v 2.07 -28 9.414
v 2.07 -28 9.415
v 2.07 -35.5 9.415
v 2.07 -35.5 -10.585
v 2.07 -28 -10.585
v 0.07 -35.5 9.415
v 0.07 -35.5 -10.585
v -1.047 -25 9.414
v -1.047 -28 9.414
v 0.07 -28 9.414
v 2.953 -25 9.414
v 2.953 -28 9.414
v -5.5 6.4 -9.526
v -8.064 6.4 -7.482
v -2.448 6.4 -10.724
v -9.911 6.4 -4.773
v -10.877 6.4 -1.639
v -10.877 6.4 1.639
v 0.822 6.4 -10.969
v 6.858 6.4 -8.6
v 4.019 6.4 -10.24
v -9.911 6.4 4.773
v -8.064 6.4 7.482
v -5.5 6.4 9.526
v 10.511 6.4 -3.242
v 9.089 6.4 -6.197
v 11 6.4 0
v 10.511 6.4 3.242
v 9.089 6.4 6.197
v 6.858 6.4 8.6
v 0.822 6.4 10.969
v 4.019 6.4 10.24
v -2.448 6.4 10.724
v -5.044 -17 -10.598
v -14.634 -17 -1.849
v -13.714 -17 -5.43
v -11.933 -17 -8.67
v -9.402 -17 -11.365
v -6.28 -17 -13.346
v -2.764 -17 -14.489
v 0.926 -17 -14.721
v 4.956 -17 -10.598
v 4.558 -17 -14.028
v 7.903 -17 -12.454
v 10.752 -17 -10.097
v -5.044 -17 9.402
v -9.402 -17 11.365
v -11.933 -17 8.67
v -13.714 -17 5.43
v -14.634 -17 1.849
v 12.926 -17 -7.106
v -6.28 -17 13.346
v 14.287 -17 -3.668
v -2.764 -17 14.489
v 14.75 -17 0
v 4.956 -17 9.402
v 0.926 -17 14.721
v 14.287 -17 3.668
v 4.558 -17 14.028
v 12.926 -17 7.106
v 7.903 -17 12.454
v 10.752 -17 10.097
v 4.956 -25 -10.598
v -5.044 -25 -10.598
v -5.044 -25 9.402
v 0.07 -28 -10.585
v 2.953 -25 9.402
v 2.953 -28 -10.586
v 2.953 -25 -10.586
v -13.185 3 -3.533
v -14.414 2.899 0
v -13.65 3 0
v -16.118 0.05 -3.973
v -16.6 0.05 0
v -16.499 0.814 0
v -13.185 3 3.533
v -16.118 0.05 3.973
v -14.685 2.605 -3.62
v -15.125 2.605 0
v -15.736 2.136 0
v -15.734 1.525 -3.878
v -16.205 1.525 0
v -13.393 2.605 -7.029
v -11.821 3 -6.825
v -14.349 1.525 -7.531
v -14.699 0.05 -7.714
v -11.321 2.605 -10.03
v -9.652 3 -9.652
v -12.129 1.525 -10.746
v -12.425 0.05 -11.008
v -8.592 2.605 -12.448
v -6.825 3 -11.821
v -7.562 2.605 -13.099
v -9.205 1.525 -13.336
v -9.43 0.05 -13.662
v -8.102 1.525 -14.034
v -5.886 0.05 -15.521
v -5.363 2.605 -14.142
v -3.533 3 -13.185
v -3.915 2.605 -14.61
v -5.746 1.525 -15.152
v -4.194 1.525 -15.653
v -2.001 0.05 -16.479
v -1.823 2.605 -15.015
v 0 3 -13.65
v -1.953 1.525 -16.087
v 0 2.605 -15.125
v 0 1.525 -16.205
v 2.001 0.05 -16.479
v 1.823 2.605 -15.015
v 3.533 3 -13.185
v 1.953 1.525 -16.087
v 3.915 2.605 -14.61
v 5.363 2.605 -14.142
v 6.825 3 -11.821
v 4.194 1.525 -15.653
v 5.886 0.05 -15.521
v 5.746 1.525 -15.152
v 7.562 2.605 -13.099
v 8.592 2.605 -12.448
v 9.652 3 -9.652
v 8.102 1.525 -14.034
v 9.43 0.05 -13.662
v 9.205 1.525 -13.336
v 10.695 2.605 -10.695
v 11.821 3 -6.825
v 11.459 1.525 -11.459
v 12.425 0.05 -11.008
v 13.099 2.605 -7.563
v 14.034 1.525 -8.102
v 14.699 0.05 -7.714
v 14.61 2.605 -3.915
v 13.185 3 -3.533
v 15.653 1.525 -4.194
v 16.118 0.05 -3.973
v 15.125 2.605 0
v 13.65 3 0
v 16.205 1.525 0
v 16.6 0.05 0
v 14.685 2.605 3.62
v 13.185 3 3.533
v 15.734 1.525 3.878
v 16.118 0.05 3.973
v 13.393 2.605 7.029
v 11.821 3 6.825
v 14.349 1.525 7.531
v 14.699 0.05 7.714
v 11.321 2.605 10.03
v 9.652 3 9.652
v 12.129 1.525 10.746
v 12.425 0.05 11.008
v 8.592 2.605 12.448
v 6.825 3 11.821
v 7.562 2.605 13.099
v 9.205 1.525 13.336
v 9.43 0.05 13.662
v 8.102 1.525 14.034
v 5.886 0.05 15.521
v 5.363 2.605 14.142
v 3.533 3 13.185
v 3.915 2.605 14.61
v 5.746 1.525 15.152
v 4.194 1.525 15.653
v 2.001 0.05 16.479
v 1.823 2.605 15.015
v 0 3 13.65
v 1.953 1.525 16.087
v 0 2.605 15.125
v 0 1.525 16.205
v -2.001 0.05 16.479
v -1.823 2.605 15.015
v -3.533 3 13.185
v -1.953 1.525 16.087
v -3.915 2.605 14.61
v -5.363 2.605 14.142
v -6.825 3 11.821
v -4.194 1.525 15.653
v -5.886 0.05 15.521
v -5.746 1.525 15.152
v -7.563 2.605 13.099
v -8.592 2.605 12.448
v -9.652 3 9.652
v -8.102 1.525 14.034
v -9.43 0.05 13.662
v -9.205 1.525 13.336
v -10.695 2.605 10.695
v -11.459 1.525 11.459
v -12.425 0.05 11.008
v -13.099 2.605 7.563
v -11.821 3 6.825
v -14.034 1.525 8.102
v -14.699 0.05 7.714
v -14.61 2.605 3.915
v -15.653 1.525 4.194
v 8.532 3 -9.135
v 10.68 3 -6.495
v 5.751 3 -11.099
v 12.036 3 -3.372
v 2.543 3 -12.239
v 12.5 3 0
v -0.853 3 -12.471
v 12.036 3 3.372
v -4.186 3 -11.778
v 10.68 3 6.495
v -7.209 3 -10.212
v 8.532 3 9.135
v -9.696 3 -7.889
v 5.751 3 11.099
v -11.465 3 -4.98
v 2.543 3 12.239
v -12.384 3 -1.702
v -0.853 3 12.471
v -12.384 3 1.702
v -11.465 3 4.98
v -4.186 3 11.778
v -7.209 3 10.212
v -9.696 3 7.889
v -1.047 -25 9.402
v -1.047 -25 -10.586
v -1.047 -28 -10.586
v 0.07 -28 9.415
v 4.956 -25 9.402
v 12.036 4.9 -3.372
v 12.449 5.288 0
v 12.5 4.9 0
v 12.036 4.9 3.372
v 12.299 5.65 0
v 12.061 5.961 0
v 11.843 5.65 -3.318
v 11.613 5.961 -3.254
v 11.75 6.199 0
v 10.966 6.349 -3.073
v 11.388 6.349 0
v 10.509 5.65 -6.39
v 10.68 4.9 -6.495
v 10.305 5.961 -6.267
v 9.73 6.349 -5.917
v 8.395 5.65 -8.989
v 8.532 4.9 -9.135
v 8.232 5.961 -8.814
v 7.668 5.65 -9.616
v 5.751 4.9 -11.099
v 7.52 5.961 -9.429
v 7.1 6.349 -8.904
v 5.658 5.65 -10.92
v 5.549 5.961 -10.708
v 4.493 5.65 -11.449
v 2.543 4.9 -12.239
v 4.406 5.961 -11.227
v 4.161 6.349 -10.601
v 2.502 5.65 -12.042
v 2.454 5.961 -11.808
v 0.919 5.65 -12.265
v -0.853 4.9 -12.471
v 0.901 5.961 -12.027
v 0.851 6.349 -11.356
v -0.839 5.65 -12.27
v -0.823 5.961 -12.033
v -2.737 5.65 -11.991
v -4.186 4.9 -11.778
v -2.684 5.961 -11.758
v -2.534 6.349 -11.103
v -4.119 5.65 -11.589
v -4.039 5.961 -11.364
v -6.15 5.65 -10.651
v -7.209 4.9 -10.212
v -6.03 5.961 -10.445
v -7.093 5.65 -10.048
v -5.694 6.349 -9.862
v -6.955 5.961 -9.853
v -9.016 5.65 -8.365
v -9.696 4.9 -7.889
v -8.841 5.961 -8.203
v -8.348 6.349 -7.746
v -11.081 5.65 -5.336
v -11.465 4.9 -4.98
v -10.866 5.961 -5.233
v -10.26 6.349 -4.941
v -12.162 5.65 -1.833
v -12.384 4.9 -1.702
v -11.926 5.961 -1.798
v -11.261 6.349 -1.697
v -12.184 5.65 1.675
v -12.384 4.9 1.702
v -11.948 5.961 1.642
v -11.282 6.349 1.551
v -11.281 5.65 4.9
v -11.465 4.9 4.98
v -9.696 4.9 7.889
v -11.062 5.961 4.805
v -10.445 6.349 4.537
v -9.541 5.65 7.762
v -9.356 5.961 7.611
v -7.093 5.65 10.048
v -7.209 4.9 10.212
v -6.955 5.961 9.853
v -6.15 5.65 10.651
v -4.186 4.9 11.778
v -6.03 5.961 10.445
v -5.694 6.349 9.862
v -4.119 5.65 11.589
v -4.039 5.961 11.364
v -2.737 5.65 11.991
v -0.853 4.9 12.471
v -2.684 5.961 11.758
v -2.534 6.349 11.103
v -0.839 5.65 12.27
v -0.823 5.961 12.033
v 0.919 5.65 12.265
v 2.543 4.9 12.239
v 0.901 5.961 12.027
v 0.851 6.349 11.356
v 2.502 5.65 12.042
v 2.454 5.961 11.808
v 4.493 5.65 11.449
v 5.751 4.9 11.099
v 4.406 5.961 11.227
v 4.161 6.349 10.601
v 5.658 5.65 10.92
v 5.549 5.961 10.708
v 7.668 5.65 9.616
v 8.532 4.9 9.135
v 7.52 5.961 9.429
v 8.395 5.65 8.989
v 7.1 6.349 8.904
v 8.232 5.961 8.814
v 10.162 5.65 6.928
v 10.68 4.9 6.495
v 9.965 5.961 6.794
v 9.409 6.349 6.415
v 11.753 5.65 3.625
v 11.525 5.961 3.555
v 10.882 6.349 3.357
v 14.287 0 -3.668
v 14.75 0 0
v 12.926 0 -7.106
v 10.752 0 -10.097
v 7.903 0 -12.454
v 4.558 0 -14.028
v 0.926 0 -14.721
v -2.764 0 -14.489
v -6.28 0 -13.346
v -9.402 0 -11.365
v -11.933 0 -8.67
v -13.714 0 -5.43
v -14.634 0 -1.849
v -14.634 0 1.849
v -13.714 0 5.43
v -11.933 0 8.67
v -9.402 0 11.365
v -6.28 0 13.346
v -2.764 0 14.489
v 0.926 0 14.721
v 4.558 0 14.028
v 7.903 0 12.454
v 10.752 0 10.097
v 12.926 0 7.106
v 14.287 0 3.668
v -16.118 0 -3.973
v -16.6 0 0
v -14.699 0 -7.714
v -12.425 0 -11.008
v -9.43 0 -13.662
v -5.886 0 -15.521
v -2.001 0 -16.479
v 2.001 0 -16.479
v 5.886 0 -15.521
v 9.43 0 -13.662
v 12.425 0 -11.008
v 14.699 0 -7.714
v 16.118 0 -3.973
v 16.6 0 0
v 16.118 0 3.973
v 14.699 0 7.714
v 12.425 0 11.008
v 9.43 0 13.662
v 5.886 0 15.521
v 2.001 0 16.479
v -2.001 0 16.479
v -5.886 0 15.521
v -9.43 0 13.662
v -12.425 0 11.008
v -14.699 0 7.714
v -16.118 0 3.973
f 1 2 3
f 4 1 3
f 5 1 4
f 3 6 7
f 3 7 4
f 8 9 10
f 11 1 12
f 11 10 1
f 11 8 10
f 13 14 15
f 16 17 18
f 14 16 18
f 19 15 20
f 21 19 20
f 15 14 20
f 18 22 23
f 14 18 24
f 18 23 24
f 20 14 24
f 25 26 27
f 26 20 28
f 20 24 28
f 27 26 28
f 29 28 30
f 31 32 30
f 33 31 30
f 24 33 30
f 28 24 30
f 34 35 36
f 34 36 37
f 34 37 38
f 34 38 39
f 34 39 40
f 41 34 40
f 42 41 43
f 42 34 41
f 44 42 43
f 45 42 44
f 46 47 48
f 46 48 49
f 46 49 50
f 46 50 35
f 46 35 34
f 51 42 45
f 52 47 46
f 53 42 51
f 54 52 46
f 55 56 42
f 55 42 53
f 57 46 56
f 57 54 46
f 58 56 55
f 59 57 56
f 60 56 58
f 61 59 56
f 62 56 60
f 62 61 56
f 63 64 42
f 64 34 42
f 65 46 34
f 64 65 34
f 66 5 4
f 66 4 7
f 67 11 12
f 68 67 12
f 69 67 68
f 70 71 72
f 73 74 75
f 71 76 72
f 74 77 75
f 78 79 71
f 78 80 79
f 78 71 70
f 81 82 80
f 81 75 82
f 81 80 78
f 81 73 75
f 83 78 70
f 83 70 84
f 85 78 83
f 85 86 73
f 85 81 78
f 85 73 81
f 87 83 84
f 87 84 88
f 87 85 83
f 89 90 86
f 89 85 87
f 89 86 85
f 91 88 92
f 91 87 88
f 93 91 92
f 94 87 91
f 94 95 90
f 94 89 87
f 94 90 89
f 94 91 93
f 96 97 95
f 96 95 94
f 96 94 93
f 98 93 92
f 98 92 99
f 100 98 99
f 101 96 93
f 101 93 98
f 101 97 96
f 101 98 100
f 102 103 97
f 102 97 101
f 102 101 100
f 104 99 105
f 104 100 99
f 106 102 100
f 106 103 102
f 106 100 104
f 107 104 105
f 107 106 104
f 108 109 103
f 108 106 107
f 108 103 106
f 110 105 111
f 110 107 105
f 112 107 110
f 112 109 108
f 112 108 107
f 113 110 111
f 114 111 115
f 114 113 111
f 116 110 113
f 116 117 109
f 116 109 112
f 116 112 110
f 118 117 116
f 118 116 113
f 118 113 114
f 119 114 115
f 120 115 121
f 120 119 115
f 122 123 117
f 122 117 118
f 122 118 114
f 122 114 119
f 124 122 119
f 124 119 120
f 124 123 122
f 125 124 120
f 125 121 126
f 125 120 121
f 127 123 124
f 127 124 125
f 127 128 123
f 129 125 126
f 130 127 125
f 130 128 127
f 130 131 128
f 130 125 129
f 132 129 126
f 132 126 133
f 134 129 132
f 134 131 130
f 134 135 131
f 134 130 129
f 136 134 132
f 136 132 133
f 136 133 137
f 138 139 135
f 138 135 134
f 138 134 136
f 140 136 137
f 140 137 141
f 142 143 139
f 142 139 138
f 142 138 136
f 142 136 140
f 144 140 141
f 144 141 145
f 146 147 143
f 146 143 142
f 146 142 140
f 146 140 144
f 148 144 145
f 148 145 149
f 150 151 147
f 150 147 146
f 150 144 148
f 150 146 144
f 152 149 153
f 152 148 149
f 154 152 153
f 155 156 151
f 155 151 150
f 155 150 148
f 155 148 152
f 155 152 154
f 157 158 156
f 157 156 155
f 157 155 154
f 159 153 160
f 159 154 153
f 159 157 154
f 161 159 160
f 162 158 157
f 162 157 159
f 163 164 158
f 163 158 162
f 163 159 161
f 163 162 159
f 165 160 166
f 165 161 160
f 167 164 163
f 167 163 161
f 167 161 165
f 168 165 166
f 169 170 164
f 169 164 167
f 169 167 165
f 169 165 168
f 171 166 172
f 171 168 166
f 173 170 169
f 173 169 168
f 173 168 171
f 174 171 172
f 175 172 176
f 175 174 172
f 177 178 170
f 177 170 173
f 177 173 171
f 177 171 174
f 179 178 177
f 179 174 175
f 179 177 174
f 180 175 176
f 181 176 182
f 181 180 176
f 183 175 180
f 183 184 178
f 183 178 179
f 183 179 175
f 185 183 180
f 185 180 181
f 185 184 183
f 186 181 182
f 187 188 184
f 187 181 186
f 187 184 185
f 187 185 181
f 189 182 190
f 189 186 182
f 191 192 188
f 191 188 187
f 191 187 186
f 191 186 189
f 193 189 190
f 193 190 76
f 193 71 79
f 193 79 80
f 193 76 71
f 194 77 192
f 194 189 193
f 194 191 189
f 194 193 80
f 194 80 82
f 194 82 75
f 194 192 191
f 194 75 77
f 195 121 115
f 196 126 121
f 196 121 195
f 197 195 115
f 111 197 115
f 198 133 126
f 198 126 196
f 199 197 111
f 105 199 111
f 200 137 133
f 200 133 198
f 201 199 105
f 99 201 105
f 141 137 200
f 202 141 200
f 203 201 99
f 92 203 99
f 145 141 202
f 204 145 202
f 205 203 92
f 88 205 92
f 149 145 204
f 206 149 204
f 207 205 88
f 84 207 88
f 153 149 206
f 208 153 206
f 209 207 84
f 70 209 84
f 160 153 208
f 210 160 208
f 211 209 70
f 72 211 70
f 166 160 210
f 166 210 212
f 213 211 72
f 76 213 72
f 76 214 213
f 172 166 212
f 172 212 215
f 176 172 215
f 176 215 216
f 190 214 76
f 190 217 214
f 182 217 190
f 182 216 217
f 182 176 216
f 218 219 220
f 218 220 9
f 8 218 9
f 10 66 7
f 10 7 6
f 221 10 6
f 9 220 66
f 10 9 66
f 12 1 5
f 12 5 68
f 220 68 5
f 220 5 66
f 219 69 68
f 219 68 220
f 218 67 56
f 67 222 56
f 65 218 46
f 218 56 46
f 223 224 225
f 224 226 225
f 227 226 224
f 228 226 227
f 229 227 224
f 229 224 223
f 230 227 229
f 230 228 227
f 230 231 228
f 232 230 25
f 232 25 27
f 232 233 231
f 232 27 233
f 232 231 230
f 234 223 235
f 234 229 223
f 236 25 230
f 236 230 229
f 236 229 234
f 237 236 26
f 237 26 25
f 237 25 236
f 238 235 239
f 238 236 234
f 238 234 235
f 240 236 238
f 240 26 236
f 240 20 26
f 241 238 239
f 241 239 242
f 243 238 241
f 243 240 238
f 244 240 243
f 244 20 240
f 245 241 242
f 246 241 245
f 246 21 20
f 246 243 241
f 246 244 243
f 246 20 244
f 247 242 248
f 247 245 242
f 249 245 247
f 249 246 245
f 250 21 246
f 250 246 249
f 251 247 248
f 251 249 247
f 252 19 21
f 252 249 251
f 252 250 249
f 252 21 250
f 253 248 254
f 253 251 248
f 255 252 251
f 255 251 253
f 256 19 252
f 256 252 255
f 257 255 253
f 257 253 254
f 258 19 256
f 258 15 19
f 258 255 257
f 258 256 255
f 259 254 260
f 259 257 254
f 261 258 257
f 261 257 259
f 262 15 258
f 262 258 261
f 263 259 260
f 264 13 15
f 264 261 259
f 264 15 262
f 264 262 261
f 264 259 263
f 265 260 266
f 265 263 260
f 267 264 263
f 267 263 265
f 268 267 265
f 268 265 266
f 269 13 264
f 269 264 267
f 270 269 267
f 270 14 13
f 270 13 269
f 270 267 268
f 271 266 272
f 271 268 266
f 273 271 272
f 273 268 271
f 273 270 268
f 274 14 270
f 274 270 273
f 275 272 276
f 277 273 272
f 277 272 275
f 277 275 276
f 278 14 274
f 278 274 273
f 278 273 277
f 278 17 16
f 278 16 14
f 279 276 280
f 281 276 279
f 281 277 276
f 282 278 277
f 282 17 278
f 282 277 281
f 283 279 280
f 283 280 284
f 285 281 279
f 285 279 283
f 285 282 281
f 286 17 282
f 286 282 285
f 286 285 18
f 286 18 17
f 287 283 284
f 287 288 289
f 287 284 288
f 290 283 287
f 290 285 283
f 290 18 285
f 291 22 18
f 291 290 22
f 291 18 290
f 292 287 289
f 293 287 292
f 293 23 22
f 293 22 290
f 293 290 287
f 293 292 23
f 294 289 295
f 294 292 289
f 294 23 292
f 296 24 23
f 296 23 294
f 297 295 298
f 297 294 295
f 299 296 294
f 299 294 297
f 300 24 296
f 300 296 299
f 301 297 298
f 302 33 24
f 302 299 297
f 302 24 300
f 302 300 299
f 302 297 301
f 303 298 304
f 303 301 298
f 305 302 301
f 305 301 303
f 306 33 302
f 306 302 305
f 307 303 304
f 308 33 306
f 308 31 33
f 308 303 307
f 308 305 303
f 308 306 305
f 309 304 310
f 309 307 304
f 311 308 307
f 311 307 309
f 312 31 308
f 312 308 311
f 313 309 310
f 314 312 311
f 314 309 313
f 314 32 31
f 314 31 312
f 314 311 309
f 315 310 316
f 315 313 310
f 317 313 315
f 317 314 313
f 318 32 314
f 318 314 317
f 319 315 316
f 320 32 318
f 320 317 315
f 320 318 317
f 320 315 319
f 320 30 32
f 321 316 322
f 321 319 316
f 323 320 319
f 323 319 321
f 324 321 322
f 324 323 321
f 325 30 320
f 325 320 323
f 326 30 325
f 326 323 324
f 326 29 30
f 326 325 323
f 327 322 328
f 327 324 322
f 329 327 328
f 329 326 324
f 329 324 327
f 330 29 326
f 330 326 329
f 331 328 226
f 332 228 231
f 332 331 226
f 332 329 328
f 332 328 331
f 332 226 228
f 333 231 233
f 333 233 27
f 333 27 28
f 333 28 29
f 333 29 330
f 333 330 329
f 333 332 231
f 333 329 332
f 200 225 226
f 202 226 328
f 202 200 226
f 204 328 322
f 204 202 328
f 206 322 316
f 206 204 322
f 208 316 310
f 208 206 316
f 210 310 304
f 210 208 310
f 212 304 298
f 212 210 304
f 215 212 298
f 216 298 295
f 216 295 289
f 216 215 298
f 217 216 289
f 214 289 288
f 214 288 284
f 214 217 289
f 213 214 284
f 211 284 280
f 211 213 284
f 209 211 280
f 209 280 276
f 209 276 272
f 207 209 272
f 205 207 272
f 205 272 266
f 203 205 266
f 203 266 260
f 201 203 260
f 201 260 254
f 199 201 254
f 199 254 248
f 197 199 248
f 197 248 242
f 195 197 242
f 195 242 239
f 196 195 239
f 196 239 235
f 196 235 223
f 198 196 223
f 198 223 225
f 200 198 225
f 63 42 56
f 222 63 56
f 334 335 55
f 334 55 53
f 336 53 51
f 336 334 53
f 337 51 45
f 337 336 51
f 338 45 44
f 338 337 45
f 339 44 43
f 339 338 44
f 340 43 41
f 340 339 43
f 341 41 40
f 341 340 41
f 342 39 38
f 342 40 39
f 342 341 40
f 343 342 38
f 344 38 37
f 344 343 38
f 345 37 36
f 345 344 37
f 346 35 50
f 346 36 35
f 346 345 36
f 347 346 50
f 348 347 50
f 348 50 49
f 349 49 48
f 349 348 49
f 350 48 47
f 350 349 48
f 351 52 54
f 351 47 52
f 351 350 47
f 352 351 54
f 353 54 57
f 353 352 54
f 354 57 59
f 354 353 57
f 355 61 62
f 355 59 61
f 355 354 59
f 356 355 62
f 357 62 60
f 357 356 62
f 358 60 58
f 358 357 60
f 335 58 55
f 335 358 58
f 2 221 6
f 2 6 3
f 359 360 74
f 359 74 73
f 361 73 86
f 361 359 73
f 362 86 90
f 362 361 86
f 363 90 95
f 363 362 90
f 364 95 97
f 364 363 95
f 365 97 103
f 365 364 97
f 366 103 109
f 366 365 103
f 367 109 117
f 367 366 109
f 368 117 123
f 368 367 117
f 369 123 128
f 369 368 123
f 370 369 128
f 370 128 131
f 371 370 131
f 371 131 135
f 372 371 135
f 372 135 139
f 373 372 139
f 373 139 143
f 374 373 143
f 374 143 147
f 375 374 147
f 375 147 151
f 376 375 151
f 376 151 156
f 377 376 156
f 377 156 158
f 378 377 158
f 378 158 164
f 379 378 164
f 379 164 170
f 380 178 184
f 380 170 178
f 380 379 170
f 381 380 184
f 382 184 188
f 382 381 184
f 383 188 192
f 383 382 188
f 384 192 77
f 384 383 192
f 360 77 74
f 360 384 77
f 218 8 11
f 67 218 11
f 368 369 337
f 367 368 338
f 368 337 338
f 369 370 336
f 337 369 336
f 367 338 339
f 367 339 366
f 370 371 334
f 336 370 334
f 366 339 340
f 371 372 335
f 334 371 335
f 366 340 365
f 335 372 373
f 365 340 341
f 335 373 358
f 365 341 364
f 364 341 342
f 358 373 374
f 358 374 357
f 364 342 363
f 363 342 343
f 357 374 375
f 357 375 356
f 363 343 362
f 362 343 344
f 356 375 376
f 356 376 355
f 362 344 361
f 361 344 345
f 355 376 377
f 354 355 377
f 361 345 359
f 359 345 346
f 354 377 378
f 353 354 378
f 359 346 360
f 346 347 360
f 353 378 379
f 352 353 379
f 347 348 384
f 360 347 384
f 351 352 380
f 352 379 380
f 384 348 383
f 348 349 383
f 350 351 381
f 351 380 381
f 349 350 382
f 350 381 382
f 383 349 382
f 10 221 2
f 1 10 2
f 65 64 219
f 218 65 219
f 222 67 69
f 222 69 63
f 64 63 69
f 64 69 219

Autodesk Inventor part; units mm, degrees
ref_plane "YZ Plane" through (0, 0, 0) normal (1, 0, 0) x (0, 1, 0)
ref_plane "XZ Plane" through (0, 0, 0) normal (0, 1, 0) x (-1, 0, 0)
ref_plane "XY Plane" through (0, 0, 0) normal (0, 0, 1) x (1, 0, 0)
sketch "Sketch1" plane through (0, 0, 0) normal (0, 1, 0) x (-1, 0, 0)
  circle A0 centre (0, 0) radius 12.5
  circle A1 centre (0, 0) radius 16.6
  circle A2 centre (0, 0) radius 18
  circle A3 centre (0, 0) radius 14.75
  dimension "d0" = 25
  dimension "d1" = 33.2
  dimension "d2" = 36
  dimension "d3" = 29.5
extrude "Extrusion1" add sketch "Sketch1" along normal blind 3 contours A1 | A3
sketch "Sketch2" plane through (0, 0, 0) normal (0, -1, 0) x (1, 0, 0)
  circle A0 centre (0, 0) radius 12.5 projected
  circle A1 centre (0, 0) radius 12.5
  circle A2 centre (0, 0) radius 16.6
  circle A3 centre (0, 0) radius 18
  circle A4 centre (0, 0) radius 14.75
  dimension "d6" = 25
  dimension "d7" = 33.2
  dimension "d8" = 36
  dimension "d9" = 29.5
extrude "Extrusion2" add sketch "Sketch2" against normal blind 6.4 contours A0
fillet "Fillet1" radius 1.5 1 edges at (-12.5, 6.4, 0)
fillet "Fillet2" radius 2.95 1 edges at (16.6, 3, 0)
sketch "Sketch5" plane through (0, 0, 0) normal (0, -1, 0) x (1, 0, 0)
  circle A0 centre (0, 0) radius 16.6 projected
  circle A1 centre (0, 0) radius 14.75
  dimension "d23" = 29.5
extrude "Extrusion5" add sketch "Sketch5" along normal blind 17 contours A1
sketch "Sketch7" plane through (0, -17, 0) normal (0, -1, 0) x (1, 0, 0)
  line L0 (4.9559, 9.4025) -> (-5.0441, 9.4025)
  line L1 (-5.0441, 9.4025) -> (-5.0441, -10.5975)
  line L2 (-5.0441, -10.5975) -> (4.9559, -10.5975)
  line L3 (4.9559, -10.5975) -> (4.9559, 9.4025)
  point P0 (0, 0)
  dimension "d30" = 10
  dimension "d32" = 20
extrude "Extrusion7" add sketch "Sketch7" along normal blind 8
sketch "Sketch8" plane through (0, -25, 0) normal (0, -1, 0) x (1, 0, 0)
  line L0 (-1.0467, 9.4141) -> (2.9533, 9.4141)
  line L1 (2.9533, 9.4141) -> (2.9533, -10.5859)
  line L2 (2.9533, -10.5859) -> (-1.0467, -10.5859)
  line L3 (-1.0467, -10.5859) -> (-1.0467, 9.4141)
  point P0 (0, 0)
  dimension "d35" = 4
  dimension "d37" = 20
extrude "Extrusion8" add sketch "Sketch8" along normal blind 3
thread "Thread1" size "M30x1" class "6g" standard "ANSI Metric M Profile" full length
sketch "Sketch10" plane through (0, -28, 0) normal (0, -1, 0) x (1, 0, 0)
  line L0 (0.0695, 9.4148) -> (2.0695, 9.4148)
  line L1 (2.0695, 9.4148) -> (2.0695, -10.5852)
  line L2 (2.0695, -10.5852) -> (0.0695, -10.5852)
  line L3 (0.0695, -10.5852) -> (0.0695, 9.4148)
  point P0 (0, 0)
  dimension "d46" = 20
  dimension "d48" = 2
extrude "Extrusion10" add sketch "Sketch10" along normal blind 7.5
properties part number "OBSN-30-B" material "Nylon 6"
